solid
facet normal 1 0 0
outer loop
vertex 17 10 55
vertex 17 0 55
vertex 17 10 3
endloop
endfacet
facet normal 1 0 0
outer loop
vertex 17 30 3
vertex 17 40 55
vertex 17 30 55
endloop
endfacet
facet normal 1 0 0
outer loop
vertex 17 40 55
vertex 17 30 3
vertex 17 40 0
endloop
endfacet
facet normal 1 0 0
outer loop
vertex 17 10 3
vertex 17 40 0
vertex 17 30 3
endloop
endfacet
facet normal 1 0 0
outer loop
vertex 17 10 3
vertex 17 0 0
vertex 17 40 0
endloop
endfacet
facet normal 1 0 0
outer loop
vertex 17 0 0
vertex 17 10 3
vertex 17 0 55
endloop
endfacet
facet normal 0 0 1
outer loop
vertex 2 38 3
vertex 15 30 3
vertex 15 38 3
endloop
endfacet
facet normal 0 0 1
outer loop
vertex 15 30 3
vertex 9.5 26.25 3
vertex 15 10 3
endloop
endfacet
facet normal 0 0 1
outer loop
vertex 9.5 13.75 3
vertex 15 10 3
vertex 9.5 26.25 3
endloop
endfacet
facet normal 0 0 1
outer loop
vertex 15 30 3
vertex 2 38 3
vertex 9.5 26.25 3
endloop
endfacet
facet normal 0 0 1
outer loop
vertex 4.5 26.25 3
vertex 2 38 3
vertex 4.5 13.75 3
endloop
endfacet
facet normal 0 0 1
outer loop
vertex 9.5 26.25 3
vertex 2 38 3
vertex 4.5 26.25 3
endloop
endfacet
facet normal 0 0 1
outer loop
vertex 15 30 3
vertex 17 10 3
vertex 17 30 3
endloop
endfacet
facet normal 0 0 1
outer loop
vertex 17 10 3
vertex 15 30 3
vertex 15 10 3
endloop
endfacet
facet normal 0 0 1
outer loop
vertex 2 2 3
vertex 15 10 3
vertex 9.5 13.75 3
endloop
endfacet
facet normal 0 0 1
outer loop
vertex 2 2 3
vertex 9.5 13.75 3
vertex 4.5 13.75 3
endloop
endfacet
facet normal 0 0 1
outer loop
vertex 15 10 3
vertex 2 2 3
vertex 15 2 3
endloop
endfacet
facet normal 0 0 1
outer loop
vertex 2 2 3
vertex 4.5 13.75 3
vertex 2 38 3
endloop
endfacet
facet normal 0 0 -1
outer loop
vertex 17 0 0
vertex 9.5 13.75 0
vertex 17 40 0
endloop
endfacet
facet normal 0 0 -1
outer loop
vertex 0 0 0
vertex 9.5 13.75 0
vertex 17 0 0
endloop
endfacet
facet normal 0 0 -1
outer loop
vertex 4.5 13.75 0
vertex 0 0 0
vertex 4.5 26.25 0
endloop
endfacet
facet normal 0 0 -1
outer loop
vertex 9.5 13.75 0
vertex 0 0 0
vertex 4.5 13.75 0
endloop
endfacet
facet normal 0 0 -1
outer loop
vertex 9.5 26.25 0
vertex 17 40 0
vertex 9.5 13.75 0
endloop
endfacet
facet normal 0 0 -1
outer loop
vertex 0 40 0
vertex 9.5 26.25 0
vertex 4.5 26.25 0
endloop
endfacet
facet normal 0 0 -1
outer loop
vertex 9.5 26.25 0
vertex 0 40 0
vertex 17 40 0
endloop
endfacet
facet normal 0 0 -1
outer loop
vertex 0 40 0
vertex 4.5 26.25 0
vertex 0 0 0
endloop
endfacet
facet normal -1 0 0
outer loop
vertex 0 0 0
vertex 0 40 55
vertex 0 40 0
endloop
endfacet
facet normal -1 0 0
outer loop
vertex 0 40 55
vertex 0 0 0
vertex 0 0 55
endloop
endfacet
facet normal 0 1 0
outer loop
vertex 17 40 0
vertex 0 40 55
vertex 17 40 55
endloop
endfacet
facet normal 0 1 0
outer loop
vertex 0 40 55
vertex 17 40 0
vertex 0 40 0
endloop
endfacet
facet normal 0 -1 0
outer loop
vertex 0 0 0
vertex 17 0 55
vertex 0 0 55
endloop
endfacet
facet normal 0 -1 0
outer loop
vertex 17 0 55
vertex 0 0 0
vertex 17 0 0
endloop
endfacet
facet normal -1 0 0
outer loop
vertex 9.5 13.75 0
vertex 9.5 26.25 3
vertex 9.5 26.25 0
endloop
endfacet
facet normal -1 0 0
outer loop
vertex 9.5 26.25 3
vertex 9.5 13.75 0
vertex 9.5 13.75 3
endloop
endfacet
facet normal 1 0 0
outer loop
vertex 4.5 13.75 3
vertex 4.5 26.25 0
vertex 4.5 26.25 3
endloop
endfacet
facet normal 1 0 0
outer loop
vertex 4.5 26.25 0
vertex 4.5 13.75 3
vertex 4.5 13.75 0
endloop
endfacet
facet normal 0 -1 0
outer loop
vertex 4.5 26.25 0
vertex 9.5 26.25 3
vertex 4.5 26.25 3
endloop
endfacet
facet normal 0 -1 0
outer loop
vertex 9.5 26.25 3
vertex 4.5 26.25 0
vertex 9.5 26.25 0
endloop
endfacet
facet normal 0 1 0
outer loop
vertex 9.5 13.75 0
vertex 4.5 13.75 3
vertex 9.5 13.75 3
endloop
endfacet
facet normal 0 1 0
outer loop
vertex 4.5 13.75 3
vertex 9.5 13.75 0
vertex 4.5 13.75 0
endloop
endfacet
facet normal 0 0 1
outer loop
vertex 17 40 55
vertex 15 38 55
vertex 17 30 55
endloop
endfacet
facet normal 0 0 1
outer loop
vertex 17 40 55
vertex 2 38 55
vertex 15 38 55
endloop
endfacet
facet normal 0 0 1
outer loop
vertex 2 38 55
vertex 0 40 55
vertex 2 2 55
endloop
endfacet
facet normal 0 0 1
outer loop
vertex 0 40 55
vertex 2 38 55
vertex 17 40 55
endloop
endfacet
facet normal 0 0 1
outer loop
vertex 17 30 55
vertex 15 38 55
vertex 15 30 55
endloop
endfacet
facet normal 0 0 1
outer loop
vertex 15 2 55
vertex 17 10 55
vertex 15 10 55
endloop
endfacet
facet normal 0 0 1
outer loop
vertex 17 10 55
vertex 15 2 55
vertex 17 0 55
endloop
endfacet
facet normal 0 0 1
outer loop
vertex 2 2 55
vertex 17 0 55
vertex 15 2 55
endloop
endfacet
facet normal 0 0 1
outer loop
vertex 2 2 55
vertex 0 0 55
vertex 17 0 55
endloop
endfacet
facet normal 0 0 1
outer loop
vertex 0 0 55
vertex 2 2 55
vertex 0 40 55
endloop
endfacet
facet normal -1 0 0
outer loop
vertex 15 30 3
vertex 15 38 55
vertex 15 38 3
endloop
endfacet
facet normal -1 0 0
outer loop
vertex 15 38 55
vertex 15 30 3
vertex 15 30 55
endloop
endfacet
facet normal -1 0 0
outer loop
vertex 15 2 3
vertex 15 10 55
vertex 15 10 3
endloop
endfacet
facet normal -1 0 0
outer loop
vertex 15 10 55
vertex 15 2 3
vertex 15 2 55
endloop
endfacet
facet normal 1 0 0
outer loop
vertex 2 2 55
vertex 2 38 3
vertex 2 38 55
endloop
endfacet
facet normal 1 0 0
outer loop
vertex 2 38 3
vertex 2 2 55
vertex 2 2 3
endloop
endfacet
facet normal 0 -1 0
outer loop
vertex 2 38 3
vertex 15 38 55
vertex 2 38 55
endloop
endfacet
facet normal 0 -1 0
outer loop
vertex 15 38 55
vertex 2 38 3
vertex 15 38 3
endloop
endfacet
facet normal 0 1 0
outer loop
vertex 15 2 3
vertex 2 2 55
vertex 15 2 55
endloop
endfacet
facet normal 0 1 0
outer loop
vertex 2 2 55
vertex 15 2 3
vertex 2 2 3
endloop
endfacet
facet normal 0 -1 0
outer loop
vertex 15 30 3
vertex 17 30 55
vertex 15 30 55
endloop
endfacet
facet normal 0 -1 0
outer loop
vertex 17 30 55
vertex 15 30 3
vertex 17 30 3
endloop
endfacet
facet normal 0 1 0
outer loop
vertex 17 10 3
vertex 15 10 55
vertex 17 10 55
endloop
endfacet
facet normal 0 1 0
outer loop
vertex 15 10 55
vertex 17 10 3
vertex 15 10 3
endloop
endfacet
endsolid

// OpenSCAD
/*
Sonoff Zigbee Wall Mount

Copyright 2024 nomike[AT]nomike[DOT]com

Redistribution and use in source and binary forms, with or without
modification, are permitted provided that the following conditions are met:

1. Redistributions of source code must retain the above copyright notice, this
list of conditions and the following disclaimer.

2. Redistributions in binary form must reproduce the above copyright notice,
this list of conditions and the following disclaimer in the documentation
and/or other materials provided with the distribution.

THIS SOFTWARE IS PROVIDED BY THE COPYRIGHT HOLDERS AND CONTRIBUTORS “AS IS” AND
ANY EXPRESS OR IMPLIED WARRANTIES, INCLUDING, BUT NOT LIMITED TO, THE IMPLIED
WARRANTIES OF MERCHANTABILITY AND FITNESS FOR A PARTICULAR PURPOSE ARE
DISCLAIMED. IN NO EVENT SHALL THE COPYRIGHT HOLDER OR CONTRIBUTORS BE LIABLE FOR
ANY DIRECT, INDIRECT, INCIDENTAL, SPECIAL, EXEMPLARY, OR CONSEQUENTIAL DAMAGES
(INCLUDING, BUT NOT LIMITED TO, PROCUREMENT OF SUBSTITUTE GOODS OR SERVICES;
LOSS OF USE, DATA, OR PROFITS; OR BUSINESS INTERRUPTION) HOWEVER CAUSED AND ON
ANY THEORY OF LIABILITY, WHETHER IN CONTRACT, STRICT LIABILITY, OR TORT
(INCLUDING NEGLIGENCE OR OTHERWISE) ARISING IN ANY WAY OUT OF THE USE OF THIS
SOFTWARE, EVEN IF ADVISED OF THE POSSIBILITY OF SUCH DAMAGE.
*/
inner_width = 13;
inner_length = 36;
inner_height = 52;
base_height = 3;
wall_strength = 2;
usb_offset_y = 0; // 3
usb_offset_x = -1.5; // 0
usb_cutout_width = 5;
usb_cutout_length = 12.5;

outer_width = inner_width + (2 * wall_strength);
outer_length = inner_length + (2 * wall_strength);
front_slit_length = 20;

union() {
    difference() {
        translate([
            0,
            0,
            0
        ])
        cube([
            outer_width,
            outer_length,
            base_height
        ]);
        
        translate([
            ((outer_width - usb_cutout_width) / 2) + usb_offset_x,
            ((outer_length - usb_cutout_length) / 2) + usb_offset_y,
            0
        ])
        cube([
            usb_cutout_width,
            usb_cutout_length,
            base_height
        ]);
    }
    difference() {
        translate([0, 0, base_height]) cube([inner_width + (2 * wall_strength), inner_length + (2 * wall_strength), inner_height]);
        translate([wall_strength, wall_strength, base_height]) cube([inner_width, inner_length, inner_height]);
        translate([outer_width - wall_strength, (outer_length - front_slit_length) / 2, base_height]) cube([wall_strength, front_slit_length, inner_height]);

    }
}
